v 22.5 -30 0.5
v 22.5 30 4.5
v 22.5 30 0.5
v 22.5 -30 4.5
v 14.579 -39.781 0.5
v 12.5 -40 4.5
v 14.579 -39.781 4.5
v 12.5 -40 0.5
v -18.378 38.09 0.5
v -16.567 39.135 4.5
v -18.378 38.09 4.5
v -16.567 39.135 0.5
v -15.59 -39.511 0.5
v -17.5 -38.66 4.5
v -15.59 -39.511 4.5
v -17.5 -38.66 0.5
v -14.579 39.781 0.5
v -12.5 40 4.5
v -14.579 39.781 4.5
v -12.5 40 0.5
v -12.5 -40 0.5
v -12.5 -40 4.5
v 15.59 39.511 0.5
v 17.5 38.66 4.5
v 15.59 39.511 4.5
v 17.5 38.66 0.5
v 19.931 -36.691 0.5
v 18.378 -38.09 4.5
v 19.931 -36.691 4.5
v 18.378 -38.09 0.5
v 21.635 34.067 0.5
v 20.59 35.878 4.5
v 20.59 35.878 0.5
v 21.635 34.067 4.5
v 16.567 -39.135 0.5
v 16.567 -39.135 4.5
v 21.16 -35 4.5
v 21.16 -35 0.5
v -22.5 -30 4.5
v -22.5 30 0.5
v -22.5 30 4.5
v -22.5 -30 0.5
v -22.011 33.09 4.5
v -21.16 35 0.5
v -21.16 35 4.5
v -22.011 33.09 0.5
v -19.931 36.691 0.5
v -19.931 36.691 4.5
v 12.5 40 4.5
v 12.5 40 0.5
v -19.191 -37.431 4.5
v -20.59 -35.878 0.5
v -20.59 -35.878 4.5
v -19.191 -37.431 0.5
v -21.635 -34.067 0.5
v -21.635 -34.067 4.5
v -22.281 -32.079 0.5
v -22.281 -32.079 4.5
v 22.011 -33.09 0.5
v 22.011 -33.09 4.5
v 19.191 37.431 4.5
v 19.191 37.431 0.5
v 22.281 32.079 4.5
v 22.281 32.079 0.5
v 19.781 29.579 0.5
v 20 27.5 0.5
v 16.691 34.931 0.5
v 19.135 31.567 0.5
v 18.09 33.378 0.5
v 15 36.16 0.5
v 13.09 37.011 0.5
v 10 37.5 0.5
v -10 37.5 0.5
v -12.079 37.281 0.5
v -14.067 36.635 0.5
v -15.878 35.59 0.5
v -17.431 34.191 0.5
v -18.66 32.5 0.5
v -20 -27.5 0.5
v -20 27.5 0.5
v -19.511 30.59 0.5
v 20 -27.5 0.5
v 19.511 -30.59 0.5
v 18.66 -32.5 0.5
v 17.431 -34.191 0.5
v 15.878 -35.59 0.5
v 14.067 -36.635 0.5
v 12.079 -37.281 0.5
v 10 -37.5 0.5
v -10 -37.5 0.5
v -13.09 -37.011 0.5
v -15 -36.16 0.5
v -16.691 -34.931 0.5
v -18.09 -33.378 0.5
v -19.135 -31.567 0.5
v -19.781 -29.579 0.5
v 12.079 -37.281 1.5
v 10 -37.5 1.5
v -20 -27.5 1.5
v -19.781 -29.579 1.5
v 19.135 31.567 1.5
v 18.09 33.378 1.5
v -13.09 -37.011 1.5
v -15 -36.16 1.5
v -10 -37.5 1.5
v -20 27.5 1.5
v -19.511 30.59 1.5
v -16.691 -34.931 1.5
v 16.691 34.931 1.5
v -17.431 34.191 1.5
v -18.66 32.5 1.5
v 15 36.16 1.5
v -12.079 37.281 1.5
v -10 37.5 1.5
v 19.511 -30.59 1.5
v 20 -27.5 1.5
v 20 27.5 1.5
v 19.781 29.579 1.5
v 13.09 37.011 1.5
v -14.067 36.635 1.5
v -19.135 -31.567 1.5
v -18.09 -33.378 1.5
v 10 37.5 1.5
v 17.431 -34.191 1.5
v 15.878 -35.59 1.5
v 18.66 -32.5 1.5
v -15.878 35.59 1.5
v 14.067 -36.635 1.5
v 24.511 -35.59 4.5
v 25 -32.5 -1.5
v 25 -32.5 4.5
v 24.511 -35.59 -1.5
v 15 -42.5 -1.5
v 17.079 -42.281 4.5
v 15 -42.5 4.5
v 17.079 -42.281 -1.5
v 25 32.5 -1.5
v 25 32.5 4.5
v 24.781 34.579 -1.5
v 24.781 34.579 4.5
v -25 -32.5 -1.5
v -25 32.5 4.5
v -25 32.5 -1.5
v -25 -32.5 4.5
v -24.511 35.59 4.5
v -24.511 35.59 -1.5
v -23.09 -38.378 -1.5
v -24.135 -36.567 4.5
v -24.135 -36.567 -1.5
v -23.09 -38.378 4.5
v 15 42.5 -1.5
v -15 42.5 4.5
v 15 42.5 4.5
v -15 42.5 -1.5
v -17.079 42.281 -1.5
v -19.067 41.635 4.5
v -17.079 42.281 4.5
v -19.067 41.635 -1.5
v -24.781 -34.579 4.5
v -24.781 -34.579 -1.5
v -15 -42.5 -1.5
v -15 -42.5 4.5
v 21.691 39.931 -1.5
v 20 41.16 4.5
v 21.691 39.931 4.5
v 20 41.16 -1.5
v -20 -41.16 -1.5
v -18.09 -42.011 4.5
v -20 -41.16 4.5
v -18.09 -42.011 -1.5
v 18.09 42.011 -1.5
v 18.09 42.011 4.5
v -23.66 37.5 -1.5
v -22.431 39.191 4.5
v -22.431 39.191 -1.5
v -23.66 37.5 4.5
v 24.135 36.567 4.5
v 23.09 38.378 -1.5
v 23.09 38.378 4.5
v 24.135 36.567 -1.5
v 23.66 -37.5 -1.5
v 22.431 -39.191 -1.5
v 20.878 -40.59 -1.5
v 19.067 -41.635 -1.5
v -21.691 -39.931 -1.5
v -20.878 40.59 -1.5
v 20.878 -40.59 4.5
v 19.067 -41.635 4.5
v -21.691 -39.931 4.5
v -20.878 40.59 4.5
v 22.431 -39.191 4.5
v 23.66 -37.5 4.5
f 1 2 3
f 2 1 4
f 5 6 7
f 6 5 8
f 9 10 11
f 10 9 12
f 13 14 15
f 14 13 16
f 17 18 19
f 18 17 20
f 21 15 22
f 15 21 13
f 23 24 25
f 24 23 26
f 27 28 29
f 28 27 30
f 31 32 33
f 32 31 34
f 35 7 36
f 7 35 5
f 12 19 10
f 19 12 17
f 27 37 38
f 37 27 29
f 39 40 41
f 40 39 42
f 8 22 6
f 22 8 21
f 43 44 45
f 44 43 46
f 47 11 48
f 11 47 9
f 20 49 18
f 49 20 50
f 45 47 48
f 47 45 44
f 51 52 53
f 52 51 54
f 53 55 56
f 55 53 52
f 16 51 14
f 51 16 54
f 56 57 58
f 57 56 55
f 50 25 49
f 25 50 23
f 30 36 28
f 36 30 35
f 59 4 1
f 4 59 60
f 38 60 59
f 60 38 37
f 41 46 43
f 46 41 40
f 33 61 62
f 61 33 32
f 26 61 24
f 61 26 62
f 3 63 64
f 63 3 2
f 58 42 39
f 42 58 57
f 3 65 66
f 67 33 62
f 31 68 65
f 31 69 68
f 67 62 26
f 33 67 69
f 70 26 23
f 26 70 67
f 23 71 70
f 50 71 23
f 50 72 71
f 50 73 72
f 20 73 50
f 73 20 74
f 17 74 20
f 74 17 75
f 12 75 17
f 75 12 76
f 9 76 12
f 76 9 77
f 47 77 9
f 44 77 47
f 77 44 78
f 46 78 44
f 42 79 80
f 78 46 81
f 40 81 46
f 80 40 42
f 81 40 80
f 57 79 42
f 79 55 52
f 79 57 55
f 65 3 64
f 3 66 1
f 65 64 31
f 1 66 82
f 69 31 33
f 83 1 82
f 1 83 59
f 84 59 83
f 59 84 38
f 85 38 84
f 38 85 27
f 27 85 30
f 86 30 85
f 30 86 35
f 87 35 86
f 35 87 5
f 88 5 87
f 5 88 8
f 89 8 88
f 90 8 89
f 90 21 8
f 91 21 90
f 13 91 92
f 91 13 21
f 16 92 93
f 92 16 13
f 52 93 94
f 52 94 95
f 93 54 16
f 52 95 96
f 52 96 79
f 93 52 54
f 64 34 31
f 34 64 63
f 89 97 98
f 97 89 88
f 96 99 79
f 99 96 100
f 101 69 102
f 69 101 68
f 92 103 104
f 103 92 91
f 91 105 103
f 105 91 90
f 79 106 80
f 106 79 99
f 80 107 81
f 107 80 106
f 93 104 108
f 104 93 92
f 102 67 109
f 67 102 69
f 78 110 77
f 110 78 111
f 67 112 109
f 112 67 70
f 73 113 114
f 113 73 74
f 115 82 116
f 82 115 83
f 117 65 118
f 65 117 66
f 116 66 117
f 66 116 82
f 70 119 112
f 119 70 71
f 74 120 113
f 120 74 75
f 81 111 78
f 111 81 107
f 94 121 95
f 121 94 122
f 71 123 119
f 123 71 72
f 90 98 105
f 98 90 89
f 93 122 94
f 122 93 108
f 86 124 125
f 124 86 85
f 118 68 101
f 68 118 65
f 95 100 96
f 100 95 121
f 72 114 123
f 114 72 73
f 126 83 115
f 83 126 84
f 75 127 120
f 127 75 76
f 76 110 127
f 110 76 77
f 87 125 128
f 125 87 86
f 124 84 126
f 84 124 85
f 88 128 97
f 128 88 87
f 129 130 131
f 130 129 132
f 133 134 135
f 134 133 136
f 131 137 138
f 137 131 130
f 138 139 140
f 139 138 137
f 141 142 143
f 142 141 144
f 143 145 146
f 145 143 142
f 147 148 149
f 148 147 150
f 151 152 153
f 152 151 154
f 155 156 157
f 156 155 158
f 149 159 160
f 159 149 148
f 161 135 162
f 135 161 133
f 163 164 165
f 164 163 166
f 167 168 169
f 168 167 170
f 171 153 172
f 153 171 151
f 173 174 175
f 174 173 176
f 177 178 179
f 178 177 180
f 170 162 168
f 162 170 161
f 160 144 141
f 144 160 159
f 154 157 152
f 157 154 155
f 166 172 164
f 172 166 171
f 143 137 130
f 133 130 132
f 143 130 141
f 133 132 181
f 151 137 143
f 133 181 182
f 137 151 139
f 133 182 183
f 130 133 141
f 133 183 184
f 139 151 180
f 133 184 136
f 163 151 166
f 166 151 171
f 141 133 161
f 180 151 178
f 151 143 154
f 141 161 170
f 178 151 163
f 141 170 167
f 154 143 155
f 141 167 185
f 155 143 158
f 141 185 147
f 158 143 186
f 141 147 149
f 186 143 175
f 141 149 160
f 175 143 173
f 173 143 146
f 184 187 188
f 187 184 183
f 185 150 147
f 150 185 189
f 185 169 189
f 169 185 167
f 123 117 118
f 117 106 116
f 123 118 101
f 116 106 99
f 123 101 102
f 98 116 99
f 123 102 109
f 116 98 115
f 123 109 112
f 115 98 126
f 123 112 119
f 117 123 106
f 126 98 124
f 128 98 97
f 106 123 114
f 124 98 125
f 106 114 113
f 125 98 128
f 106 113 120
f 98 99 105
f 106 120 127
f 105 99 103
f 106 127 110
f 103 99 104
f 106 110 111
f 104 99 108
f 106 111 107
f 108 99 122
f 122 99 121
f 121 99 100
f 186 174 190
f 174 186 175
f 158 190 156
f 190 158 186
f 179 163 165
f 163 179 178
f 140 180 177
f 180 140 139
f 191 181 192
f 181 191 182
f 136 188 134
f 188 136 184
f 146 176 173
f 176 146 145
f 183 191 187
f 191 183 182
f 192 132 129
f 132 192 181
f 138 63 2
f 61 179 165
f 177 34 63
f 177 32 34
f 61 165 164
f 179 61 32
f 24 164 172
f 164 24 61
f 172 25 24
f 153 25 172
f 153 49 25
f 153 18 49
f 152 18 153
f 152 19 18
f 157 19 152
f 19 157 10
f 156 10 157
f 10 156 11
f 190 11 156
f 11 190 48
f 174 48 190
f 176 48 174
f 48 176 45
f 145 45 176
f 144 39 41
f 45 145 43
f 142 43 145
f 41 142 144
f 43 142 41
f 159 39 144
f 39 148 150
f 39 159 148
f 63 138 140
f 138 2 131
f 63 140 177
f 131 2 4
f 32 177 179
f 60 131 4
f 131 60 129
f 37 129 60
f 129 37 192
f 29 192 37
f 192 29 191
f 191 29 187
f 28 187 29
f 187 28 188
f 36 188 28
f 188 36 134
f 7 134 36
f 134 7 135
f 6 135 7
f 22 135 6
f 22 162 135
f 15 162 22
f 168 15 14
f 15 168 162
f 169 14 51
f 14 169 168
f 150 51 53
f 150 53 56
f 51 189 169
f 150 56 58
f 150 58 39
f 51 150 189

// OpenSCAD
/*
 * Test for a stamp mold
 */
echo(version=version());

// Base plate
// ----------
plateWidth = 50;    // 50
plateLength = 85;   // 50
plateThickNess = 3;
cornerRadius = 10;

logo = "./images/SF.pelican.small.png"; 
imgRatio = 0.9;
logox = 500 * imgRatio; 
logoy = 450 * imgRatio; 

module roundedRect(size, radius) {  
	linear_extrude(height=size.z, center=true) {
		offset(radius) offset(-radius) {
			square([size.x, size.y], center = true);
		}
	}
}

difference() {  
	union() {
		difference() {
			roundedRect([plateWidth, plateLength, plateThickNess], cornerRadius);
			translate([0, 0, 2]) {
				scale([.9 * plateWidth / logox, .9 * plateWidth / logoy, .02]) {
					color("white") {
						rotate([0, 0, -90]) {
							surface(file=logo, invert=true, center=true);
						}
					}
				}
        // the groove around the picture
        difference() {
          roundedRect([plateWidth -  5, plateLength -  5, plateThickNess], cornerRadius);
          roundedRect([plateWidth - 10, plateLength - 10, plateThickNess * 1.1], cornerRadius);
        }
			}
		}
		// The frame
		translate([0, 0, (plateThickNess / 1)]) {
			difference() {
				roundedRect([plateWidth, plateLength, plateThickNess], cornerRadius);
				roundedRect([plateWidth - 5, plateLength - 5, plateThickNess * 1.1], cornerRadius);
			}
		}
	}
}
